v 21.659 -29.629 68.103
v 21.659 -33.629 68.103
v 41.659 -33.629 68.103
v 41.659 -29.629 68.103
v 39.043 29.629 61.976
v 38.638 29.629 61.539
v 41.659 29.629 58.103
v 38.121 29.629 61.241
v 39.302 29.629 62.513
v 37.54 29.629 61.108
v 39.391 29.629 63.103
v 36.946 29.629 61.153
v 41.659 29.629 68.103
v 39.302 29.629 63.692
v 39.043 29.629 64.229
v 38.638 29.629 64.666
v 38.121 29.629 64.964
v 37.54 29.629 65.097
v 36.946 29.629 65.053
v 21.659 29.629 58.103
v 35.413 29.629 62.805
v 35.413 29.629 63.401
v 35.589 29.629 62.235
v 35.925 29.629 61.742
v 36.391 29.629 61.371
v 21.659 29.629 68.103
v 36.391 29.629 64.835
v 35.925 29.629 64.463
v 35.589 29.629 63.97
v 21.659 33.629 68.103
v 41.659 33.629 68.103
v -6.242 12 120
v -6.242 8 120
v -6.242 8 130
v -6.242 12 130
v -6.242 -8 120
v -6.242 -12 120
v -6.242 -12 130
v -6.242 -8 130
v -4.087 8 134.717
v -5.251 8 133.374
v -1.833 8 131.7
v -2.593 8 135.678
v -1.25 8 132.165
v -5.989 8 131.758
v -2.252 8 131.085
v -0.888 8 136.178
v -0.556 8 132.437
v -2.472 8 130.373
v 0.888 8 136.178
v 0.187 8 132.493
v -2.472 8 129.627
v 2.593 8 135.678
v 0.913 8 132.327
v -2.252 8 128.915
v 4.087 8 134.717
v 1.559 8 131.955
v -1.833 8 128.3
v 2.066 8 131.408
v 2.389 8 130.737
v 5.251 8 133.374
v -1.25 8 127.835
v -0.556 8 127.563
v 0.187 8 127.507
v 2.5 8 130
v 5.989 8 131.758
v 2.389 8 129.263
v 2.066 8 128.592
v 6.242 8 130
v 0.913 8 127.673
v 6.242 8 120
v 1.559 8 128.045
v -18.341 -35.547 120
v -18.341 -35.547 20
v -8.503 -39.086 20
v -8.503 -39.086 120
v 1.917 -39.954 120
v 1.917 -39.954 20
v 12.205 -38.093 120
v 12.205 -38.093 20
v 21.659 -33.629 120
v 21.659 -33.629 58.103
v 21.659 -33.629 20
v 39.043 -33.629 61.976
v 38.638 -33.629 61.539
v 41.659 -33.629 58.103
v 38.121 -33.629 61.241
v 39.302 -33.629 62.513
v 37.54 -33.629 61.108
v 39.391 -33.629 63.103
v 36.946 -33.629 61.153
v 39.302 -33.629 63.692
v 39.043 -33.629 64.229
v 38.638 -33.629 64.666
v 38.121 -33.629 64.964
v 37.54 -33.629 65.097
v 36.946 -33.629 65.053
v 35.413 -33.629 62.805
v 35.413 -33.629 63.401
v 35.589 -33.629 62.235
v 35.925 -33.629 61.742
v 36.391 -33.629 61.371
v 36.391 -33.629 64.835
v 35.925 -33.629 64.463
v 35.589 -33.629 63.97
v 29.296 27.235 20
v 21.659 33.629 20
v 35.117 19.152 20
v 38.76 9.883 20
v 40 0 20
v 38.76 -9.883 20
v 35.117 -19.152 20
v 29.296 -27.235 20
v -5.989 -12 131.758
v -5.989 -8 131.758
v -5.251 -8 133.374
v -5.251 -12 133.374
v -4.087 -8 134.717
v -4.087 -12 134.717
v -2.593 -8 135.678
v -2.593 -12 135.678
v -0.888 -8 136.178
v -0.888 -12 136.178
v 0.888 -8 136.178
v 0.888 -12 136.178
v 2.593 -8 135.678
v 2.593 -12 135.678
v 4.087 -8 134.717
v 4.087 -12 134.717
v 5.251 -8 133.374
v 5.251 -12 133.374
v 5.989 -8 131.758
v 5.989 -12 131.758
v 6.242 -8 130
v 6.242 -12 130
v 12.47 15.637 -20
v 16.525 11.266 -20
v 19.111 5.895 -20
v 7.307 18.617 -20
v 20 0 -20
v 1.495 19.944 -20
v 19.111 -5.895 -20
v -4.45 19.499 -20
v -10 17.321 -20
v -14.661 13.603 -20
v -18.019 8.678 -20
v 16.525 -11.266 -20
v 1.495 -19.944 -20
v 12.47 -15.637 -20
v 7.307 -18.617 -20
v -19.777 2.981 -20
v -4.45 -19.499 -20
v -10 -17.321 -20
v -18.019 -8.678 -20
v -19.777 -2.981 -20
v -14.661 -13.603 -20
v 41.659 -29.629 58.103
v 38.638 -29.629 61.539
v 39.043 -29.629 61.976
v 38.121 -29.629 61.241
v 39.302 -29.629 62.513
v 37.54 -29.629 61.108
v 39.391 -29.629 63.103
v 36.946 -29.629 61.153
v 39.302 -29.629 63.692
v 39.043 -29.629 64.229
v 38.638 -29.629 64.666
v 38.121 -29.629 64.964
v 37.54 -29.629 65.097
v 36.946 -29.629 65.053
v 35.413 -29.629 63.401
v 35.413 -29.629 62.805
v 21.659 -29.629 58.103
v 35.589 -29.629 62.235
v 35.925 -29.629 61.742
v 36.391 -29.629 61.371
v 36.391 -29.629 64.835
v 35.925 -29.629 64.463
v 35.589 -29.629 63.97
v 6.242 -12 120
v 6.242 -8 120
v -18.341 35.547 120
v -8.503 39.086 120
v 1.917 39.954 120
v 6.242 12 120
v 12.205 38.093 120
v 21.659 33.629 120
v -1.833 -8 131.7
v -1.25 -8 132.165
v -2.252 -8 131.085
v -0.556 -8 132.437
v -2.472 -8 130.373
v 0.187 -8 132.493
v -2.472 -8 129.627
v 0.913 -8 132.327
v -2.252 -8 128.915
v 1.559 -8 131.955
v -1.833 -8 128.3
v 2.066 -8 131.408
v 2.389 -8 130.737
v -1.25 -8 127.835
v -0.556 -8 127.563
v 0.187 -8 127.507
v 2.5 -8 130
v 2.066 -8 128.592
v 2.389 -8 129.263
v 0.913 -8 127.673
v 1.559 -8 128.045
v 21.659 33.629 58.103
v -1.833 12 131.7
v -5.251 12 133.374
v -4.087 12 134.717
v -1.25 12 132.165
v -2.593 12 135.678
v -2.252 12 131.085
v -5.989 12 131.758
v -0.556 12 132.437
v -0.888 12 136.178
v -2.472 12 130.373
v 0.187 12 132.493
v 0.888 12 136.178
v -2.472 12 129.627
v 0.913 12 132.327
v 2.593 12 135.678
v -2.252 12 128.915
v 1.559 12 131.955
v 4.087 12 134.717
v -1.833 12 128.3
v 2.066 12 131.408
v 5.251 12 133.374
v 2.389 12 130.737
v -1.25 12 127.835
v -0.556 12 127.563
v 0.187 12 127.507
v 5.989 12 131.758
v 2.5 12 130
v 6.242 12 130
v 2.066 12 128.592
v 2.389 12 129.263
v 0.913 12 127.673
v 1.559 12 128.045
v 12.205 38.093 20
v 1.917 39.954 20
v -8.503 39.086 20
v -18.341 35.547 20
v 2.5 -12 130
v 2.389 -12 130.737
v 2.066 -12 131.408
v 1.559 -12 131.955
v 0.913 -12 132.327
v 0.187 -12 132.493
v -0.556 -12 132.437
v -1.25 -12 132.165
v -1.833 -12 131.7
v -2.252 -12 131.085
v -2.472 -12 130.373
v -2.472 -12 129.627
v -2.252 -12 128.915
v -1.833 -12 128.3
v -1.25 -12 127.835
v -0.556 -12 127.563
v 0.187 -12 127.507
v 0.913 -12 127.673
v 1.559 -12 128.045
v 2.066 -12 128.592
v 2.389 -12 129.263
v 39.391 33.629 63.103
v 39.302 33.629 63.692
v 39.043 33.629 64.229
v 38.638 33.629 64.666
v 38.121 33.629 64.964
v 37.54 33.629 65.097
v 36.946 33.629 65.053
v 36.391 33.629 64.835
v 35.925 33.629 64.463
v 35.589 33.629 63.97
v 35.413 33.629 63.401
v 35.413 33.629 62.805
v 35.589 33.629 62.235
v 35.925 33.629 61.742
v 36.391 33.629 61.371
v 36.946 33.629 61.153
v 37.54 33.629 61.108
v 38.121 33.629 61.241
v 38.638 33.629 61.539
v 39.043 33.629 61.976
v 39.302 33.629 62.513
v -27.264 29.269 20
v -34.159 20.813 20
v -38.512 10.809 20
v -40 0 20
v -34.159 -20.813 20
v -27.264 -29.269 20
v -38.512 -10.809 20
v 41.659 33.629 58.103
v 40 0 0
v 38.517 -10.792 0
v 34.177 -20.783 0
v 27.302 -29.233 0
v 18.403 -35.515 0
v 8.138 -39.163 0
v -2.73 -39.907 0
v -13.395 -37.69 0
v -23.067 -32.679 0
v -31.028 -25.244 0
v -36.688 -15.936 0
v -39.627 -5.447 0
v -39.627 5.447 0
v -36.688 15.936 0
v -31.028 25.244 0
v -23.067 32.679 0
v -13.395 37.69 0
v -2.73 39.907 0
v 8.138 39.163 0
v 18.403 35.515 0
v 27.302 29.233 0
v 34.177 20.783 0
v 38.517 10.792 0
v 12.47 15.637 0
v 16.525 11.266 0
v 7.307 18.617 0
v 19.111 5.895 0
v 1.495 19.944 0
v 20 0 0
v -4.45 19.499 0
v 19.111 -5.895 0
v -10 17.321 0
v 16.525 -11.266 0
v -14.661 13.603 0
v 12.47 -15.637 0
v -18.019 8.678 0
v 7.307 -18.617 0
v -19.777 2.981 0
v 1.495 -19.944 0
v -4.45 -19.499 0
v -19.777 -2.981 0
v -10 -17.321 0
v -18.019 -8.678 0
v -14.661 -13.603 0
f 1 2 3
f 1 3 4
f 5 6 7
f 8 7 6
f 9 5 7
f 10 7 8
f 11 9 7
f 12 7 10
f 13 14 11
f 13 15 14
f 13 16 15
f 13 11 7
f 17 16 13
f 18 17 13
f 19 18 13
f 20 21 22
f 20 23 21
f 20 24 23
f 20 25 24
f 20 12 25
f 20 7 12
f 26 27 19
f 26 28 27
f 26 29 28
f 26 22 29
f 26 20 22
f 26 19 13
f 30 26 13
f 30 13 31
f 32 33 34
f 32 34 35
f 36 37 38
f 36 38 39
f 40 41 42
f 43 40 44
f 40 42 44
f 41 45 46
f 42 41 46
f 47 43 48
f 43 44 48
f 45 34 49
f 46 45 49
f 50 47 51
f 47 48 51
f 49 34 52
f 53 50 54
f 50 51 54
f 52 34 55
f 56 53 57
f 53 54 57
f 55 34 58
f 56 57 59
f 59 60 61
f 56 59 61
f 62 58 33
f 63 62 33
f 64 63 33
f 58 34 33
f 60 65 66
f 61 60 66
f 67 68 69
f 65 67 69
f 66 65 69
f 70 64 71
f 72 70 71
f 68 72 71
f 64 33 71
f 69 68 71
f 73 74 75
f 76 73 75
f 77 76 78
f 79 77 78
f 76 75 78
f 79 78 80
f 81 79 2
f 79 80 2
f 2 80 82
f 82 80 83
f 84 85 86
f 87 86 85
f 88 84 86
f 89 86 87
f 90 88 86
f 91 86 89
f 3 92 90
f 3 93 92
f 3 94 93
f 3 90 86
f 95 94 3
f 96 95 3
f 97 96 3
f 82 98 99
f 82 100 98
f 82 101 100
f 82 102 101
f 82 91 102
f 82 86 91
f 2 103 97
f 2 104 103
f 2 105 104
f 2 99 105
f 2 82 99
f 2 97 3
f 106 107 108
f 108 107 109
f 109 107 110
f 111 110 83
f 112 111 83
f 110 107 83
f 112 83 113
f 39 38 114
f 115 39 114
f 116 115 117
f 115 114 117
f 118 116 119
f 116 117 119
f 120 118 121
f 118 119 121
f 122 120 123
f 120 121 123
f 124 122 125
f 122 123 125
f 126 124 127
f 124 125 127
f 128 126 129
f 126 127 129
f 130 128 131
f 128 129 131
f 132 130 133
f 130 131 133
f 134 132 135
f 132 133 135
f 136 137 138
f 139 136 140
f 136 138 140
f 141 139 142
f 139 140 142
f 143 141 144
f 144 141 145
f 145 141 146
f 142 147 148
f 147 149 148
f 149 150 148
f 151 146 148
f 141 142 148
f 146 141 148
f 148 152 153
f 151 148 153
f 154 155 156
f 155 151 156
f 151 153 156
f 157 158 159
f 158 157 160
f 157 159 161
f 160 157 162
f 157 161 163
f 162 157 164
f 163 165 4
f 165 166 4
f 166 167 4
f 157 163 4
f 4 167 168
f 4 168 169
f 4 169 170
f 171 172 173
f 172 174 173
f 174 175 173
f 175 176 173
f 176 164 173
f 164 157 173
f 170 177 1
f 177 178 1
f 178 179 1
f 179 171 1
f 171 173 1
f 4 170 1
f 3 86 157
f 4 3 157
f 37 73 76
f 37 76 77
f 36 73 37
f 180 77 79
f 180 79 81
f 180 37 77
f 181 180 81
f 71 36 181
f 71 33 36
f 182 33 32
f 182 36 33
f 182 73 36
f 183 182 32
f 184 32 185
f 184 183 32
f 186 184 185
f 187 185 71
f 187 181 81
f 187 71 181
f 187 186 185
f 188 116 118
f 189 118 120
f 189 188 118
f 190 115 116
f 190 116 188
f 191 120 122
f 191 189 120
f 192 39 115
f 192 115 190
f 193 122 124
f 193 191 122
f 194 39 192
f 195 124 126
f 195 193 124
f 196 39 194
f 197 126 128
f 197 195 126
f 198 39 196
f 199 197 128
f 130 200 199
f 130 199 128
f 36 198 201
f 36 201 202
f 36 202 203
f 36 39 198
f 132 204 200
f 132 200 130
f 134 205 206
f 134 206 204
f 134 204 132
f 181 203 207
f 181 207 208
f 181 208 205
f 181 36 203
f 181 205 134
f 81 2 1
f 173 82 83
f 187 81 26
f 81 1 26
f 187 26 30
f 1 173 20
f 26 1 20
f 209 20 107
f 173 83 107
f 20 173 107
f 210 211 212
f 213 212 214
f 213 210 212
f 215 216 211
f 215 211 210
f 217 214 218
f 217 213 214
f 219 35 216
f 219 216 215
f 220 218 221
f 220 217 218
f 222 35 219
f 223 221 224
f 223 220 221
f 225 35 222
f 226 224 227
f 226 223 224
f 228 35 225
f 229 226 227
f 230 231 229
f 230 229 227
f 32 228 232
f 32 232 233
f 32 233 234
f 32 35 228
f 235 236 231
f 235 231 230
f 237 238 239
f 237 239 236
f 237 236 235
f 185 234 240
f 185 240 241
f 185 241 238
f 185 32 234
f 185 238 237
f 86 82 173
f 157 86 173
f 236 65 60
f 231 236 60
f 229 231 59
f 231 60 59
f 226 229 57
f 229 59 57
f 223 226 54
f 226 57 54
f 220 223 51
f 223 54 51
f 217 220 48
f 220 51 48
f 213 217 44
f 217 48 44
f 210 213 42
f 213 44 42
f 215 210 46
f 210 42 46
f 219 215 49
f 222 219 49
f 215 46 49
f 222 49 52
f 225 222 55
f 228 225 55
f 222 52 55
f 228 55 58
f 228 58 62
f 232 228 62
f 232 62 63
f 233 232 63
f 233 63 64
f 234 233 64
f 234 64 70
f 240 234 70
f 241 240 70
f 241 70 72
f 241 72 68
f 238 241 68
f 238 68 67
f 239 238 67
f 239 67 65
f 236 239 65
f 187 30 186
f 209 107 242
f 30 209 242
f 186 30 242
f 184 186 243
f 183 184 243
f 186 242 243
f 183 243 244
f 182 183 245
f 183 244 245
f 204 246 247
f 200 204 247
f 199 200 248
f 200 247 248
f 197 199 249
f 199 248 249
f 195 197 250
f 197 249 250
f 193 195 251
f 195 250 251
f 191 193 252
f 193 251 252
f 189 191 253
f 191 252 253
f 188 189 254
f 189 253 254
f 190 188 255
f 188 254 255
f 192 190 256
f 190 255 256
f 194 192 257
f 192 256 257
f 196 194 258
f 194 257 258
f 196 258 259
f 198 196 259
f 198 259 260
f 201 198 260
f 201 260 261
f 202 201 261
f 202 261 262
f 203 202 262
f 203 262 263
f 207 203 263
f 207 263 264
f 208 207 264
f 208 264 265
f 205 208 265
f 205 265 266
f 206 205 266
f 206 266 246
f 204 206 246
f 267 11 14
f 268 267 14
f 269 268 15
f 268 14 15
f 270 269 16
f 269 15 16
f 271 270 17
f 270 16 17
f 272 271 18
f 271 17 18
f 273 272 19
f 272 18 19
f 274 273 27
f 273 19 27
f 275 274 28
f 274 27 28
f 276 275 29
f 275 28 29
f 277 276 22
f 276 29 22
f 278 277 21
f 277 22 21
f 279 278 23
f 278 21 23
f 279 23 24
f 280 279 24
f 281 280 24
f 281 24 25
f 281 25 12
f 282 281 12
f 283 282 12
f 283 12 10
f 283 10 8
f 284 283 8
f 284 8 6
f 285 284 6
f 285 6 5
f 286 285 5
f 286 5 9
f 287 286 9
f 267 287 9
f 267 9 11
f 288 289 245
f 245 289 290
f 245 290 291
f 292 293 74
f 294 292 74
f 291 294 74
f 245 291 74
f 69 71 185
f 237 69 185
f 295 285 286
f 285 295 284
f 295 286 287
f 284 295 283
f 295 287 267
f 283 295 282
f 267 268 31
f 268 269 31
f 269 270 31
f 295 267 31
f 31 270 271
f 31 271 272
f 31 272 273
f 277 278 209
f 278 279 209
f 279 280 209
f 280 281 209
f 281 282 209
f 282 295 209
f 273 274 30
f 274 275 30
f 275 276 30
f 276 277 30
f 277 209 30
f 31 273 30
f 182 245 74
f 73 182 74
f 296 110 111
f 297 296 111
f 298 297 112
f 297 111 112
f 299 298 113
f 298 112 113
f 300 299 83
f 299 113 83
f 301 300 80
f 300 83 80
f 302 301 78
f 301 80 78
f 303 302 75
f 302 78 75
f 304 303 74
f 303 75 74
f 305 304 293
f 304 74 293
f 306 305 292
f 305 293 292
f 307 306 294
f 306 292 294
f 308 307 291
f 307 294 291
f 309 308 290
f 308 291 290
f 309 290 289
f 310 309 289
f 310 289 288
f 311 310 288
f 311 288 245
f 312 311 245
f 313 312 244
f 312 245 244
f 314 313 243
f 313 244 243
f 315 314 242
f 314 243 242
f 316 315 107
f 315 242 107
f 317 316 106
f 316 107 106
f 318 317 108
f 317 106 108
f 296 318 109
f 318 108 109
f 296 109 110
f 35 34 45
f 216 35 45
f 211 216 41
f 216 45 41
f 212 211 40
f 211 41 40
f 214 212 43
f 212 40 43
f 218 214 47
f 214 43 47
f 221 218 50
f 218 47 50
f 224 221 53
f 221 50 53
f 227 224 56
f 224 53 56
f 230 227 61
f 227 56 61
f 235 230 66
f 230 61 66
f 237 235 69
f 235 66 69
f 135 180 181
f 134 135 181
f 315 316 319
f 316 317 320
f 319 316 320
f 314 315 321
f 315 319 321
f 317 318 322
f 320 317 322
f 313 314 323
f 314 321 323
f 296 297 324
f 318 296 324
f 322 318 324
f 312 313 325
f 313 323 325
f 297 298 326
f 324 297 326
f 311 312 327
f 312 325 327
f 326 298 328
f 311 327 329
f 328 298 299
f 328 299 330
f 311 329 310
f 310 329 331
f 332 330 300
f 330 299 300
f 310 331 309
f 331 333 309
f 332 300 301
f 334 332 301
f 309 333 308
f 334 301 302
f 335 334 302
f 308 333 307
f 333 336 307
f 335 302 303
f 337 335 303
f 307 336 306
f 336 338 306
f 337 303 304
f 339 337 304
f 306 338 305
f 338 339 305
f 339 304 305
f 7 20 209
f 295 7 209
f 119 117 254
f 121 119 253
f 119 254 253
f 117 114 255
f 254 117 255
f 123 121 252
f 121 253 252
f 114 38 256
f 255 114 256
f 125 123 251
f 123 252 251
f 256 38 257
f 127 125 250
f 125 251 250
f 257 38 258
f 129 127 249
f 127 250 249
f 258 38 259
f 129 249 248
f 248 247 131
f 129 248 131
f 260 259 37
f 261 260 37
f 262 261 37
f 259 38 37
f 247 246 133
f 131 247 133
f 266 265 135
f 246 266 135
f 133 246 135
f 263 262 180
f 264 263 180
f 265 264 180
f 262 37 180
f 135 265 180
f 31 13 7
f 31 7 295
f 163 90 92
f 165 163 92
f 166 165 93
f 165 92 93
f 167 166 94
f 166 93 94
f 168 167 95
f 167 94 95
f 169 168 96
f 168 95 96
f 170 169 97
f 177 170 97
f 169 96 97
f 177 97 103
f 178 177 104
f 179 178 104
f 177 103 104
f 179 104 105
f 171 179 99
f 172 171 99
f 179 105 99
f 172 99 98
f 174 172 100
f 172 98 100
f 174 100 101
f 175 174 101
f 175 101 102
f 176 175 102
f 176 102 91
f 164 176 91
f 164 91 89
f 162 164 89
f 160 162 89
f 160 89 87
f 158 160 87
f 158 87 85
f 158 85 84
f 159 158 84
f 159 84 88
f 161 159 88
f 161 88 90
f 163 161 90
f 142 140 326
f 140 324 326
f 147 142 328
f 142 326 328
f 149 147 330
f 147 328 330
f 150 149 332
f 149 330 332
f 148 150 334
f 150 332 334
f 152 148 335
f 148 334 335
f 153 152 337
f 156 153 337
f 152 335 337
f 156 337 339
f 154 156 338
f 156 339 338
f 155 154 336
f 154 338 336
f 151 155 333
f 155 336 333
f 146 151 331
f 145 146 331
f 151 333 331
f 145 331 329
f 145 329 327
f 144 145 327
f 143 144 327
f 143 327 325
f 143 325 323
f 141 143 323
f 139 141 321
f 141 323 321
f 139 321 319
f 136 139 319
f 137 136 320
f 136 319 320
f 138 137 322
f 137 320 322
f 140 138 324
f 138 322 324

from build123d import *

# Parameters (mm, degrees)
F0_W      = 20
F0_H      = 20
F3_DEPTH  = 100
F4_W      = 12.4831434727
F4_H      = 4
F5_DEPTH  = 20
F7_DEPTH  = 50
F6_R      = 2.5
F8_DEPTH  = 50
F9_W      = 4
F9_H      = 10
F10_DEPTH = 20
F11_DEPTH = 20
F12_R     = 2
F13_DEPTH = 100


with BuildPart() as f1:
    # F0 (on Front) → F1 (revolve)
    with BuildSketch(Plane.XZ):
        with Locations((10, -10)):
            Rectangle(F0_W, F0_H)
        Polygon((0, 20), (0, 0), (20, 0), (40, 0), (40, 20), align=None)
    revolve(axis=Axis((0, 0, 10), (0, 0, -1)))

    # F2 (on face) → F3 (join)
    with BuildSketch(Plane.XY.offset(20)):
        with BuildLine():
            ThreePointArc((21.6592059983, 33.6285413826), (1.9166212828, 39.9540556497), (-18.3407940017, 35.5473666449))
            Line((-18.3407940017, 35.5473666449), (-18.3407940017, -35.5473666449))
            ThreePointArc((-18.3407940017, -35.5473666449), (1.9166212828, -39.9540556497), (21.6592059983, -33.6285413826))
            Line((21.6592059983, -33.6285413826), (21.6592059983, 33.6285413826))
        make_face()
    extrude(amount=F3_DEPTH)

    # F4 (on face) → F5 (join)
    with BuildSketch(Plane.XY.offset(120)):
        with Locations((0, -10)):
            Rectangle(F4_W, F4_H)
        with Locations((0, 10)):
            Rectangle(F4_W, F4_H)
    extrude(amount=F5_DEPTH)

    # F6 (on face) → F7 (cut)
    with BuildSketch(Plane.XZ.offset(12)):
        with BuildLine():
            ThreePointArc((-6.2415717364, 130), (0, 136.2415717364), (6.2415717364, 130))
            Line((6.2415717364, 130), (6.2415717364, 140))
            Line((6.2415717364, 140), (-6.2415717364, 140))
            Line((-6.2415717364, 140), (-6.2415717364, 130))
        make_face()
    extrude(amount=-F7_DEPTH, mode=Mode.SUBTRACT)

    # F6 (on face) → F8 (cut)
    with BuildSketch(Plane.XZ.offset(12)):
        with Locations((0, 130)):
            Circle(F6_R)
    extrude(amount=-F8_DEPTH, mode=Mode.SUBTRACT)

    # F9 (on face) → F10 (join)
    with BuildSketch(Plane.YZ.offset(21.6592059983)):
        with Locations((-31.6285413826, 63.1026673317)):
            Rectangle(F9_W, F9_H)
    extrude(amount=F10_DEPTH)

    # F9 (on face) → F11 (join)
    with BuildSketch(Plane.YZ.offset(21.6592059983)):
        with Locations((31.6285413826, 63.1026673317)):
            Rectangle(F9_W, F9_H)
    extrude(amount=F11_DEPTH)

    # F12 (on face) → F13 (cut)
    with BuildSketch(Plane.XZ.offset(33.6285413826)):
        with Locations((37.3907499015, 63.1026673317)):
            Circle(F12_R)
    extrude(amount=-F13_DEPTH, mode=Mode.SUBTRACT)


solid = f1.part
